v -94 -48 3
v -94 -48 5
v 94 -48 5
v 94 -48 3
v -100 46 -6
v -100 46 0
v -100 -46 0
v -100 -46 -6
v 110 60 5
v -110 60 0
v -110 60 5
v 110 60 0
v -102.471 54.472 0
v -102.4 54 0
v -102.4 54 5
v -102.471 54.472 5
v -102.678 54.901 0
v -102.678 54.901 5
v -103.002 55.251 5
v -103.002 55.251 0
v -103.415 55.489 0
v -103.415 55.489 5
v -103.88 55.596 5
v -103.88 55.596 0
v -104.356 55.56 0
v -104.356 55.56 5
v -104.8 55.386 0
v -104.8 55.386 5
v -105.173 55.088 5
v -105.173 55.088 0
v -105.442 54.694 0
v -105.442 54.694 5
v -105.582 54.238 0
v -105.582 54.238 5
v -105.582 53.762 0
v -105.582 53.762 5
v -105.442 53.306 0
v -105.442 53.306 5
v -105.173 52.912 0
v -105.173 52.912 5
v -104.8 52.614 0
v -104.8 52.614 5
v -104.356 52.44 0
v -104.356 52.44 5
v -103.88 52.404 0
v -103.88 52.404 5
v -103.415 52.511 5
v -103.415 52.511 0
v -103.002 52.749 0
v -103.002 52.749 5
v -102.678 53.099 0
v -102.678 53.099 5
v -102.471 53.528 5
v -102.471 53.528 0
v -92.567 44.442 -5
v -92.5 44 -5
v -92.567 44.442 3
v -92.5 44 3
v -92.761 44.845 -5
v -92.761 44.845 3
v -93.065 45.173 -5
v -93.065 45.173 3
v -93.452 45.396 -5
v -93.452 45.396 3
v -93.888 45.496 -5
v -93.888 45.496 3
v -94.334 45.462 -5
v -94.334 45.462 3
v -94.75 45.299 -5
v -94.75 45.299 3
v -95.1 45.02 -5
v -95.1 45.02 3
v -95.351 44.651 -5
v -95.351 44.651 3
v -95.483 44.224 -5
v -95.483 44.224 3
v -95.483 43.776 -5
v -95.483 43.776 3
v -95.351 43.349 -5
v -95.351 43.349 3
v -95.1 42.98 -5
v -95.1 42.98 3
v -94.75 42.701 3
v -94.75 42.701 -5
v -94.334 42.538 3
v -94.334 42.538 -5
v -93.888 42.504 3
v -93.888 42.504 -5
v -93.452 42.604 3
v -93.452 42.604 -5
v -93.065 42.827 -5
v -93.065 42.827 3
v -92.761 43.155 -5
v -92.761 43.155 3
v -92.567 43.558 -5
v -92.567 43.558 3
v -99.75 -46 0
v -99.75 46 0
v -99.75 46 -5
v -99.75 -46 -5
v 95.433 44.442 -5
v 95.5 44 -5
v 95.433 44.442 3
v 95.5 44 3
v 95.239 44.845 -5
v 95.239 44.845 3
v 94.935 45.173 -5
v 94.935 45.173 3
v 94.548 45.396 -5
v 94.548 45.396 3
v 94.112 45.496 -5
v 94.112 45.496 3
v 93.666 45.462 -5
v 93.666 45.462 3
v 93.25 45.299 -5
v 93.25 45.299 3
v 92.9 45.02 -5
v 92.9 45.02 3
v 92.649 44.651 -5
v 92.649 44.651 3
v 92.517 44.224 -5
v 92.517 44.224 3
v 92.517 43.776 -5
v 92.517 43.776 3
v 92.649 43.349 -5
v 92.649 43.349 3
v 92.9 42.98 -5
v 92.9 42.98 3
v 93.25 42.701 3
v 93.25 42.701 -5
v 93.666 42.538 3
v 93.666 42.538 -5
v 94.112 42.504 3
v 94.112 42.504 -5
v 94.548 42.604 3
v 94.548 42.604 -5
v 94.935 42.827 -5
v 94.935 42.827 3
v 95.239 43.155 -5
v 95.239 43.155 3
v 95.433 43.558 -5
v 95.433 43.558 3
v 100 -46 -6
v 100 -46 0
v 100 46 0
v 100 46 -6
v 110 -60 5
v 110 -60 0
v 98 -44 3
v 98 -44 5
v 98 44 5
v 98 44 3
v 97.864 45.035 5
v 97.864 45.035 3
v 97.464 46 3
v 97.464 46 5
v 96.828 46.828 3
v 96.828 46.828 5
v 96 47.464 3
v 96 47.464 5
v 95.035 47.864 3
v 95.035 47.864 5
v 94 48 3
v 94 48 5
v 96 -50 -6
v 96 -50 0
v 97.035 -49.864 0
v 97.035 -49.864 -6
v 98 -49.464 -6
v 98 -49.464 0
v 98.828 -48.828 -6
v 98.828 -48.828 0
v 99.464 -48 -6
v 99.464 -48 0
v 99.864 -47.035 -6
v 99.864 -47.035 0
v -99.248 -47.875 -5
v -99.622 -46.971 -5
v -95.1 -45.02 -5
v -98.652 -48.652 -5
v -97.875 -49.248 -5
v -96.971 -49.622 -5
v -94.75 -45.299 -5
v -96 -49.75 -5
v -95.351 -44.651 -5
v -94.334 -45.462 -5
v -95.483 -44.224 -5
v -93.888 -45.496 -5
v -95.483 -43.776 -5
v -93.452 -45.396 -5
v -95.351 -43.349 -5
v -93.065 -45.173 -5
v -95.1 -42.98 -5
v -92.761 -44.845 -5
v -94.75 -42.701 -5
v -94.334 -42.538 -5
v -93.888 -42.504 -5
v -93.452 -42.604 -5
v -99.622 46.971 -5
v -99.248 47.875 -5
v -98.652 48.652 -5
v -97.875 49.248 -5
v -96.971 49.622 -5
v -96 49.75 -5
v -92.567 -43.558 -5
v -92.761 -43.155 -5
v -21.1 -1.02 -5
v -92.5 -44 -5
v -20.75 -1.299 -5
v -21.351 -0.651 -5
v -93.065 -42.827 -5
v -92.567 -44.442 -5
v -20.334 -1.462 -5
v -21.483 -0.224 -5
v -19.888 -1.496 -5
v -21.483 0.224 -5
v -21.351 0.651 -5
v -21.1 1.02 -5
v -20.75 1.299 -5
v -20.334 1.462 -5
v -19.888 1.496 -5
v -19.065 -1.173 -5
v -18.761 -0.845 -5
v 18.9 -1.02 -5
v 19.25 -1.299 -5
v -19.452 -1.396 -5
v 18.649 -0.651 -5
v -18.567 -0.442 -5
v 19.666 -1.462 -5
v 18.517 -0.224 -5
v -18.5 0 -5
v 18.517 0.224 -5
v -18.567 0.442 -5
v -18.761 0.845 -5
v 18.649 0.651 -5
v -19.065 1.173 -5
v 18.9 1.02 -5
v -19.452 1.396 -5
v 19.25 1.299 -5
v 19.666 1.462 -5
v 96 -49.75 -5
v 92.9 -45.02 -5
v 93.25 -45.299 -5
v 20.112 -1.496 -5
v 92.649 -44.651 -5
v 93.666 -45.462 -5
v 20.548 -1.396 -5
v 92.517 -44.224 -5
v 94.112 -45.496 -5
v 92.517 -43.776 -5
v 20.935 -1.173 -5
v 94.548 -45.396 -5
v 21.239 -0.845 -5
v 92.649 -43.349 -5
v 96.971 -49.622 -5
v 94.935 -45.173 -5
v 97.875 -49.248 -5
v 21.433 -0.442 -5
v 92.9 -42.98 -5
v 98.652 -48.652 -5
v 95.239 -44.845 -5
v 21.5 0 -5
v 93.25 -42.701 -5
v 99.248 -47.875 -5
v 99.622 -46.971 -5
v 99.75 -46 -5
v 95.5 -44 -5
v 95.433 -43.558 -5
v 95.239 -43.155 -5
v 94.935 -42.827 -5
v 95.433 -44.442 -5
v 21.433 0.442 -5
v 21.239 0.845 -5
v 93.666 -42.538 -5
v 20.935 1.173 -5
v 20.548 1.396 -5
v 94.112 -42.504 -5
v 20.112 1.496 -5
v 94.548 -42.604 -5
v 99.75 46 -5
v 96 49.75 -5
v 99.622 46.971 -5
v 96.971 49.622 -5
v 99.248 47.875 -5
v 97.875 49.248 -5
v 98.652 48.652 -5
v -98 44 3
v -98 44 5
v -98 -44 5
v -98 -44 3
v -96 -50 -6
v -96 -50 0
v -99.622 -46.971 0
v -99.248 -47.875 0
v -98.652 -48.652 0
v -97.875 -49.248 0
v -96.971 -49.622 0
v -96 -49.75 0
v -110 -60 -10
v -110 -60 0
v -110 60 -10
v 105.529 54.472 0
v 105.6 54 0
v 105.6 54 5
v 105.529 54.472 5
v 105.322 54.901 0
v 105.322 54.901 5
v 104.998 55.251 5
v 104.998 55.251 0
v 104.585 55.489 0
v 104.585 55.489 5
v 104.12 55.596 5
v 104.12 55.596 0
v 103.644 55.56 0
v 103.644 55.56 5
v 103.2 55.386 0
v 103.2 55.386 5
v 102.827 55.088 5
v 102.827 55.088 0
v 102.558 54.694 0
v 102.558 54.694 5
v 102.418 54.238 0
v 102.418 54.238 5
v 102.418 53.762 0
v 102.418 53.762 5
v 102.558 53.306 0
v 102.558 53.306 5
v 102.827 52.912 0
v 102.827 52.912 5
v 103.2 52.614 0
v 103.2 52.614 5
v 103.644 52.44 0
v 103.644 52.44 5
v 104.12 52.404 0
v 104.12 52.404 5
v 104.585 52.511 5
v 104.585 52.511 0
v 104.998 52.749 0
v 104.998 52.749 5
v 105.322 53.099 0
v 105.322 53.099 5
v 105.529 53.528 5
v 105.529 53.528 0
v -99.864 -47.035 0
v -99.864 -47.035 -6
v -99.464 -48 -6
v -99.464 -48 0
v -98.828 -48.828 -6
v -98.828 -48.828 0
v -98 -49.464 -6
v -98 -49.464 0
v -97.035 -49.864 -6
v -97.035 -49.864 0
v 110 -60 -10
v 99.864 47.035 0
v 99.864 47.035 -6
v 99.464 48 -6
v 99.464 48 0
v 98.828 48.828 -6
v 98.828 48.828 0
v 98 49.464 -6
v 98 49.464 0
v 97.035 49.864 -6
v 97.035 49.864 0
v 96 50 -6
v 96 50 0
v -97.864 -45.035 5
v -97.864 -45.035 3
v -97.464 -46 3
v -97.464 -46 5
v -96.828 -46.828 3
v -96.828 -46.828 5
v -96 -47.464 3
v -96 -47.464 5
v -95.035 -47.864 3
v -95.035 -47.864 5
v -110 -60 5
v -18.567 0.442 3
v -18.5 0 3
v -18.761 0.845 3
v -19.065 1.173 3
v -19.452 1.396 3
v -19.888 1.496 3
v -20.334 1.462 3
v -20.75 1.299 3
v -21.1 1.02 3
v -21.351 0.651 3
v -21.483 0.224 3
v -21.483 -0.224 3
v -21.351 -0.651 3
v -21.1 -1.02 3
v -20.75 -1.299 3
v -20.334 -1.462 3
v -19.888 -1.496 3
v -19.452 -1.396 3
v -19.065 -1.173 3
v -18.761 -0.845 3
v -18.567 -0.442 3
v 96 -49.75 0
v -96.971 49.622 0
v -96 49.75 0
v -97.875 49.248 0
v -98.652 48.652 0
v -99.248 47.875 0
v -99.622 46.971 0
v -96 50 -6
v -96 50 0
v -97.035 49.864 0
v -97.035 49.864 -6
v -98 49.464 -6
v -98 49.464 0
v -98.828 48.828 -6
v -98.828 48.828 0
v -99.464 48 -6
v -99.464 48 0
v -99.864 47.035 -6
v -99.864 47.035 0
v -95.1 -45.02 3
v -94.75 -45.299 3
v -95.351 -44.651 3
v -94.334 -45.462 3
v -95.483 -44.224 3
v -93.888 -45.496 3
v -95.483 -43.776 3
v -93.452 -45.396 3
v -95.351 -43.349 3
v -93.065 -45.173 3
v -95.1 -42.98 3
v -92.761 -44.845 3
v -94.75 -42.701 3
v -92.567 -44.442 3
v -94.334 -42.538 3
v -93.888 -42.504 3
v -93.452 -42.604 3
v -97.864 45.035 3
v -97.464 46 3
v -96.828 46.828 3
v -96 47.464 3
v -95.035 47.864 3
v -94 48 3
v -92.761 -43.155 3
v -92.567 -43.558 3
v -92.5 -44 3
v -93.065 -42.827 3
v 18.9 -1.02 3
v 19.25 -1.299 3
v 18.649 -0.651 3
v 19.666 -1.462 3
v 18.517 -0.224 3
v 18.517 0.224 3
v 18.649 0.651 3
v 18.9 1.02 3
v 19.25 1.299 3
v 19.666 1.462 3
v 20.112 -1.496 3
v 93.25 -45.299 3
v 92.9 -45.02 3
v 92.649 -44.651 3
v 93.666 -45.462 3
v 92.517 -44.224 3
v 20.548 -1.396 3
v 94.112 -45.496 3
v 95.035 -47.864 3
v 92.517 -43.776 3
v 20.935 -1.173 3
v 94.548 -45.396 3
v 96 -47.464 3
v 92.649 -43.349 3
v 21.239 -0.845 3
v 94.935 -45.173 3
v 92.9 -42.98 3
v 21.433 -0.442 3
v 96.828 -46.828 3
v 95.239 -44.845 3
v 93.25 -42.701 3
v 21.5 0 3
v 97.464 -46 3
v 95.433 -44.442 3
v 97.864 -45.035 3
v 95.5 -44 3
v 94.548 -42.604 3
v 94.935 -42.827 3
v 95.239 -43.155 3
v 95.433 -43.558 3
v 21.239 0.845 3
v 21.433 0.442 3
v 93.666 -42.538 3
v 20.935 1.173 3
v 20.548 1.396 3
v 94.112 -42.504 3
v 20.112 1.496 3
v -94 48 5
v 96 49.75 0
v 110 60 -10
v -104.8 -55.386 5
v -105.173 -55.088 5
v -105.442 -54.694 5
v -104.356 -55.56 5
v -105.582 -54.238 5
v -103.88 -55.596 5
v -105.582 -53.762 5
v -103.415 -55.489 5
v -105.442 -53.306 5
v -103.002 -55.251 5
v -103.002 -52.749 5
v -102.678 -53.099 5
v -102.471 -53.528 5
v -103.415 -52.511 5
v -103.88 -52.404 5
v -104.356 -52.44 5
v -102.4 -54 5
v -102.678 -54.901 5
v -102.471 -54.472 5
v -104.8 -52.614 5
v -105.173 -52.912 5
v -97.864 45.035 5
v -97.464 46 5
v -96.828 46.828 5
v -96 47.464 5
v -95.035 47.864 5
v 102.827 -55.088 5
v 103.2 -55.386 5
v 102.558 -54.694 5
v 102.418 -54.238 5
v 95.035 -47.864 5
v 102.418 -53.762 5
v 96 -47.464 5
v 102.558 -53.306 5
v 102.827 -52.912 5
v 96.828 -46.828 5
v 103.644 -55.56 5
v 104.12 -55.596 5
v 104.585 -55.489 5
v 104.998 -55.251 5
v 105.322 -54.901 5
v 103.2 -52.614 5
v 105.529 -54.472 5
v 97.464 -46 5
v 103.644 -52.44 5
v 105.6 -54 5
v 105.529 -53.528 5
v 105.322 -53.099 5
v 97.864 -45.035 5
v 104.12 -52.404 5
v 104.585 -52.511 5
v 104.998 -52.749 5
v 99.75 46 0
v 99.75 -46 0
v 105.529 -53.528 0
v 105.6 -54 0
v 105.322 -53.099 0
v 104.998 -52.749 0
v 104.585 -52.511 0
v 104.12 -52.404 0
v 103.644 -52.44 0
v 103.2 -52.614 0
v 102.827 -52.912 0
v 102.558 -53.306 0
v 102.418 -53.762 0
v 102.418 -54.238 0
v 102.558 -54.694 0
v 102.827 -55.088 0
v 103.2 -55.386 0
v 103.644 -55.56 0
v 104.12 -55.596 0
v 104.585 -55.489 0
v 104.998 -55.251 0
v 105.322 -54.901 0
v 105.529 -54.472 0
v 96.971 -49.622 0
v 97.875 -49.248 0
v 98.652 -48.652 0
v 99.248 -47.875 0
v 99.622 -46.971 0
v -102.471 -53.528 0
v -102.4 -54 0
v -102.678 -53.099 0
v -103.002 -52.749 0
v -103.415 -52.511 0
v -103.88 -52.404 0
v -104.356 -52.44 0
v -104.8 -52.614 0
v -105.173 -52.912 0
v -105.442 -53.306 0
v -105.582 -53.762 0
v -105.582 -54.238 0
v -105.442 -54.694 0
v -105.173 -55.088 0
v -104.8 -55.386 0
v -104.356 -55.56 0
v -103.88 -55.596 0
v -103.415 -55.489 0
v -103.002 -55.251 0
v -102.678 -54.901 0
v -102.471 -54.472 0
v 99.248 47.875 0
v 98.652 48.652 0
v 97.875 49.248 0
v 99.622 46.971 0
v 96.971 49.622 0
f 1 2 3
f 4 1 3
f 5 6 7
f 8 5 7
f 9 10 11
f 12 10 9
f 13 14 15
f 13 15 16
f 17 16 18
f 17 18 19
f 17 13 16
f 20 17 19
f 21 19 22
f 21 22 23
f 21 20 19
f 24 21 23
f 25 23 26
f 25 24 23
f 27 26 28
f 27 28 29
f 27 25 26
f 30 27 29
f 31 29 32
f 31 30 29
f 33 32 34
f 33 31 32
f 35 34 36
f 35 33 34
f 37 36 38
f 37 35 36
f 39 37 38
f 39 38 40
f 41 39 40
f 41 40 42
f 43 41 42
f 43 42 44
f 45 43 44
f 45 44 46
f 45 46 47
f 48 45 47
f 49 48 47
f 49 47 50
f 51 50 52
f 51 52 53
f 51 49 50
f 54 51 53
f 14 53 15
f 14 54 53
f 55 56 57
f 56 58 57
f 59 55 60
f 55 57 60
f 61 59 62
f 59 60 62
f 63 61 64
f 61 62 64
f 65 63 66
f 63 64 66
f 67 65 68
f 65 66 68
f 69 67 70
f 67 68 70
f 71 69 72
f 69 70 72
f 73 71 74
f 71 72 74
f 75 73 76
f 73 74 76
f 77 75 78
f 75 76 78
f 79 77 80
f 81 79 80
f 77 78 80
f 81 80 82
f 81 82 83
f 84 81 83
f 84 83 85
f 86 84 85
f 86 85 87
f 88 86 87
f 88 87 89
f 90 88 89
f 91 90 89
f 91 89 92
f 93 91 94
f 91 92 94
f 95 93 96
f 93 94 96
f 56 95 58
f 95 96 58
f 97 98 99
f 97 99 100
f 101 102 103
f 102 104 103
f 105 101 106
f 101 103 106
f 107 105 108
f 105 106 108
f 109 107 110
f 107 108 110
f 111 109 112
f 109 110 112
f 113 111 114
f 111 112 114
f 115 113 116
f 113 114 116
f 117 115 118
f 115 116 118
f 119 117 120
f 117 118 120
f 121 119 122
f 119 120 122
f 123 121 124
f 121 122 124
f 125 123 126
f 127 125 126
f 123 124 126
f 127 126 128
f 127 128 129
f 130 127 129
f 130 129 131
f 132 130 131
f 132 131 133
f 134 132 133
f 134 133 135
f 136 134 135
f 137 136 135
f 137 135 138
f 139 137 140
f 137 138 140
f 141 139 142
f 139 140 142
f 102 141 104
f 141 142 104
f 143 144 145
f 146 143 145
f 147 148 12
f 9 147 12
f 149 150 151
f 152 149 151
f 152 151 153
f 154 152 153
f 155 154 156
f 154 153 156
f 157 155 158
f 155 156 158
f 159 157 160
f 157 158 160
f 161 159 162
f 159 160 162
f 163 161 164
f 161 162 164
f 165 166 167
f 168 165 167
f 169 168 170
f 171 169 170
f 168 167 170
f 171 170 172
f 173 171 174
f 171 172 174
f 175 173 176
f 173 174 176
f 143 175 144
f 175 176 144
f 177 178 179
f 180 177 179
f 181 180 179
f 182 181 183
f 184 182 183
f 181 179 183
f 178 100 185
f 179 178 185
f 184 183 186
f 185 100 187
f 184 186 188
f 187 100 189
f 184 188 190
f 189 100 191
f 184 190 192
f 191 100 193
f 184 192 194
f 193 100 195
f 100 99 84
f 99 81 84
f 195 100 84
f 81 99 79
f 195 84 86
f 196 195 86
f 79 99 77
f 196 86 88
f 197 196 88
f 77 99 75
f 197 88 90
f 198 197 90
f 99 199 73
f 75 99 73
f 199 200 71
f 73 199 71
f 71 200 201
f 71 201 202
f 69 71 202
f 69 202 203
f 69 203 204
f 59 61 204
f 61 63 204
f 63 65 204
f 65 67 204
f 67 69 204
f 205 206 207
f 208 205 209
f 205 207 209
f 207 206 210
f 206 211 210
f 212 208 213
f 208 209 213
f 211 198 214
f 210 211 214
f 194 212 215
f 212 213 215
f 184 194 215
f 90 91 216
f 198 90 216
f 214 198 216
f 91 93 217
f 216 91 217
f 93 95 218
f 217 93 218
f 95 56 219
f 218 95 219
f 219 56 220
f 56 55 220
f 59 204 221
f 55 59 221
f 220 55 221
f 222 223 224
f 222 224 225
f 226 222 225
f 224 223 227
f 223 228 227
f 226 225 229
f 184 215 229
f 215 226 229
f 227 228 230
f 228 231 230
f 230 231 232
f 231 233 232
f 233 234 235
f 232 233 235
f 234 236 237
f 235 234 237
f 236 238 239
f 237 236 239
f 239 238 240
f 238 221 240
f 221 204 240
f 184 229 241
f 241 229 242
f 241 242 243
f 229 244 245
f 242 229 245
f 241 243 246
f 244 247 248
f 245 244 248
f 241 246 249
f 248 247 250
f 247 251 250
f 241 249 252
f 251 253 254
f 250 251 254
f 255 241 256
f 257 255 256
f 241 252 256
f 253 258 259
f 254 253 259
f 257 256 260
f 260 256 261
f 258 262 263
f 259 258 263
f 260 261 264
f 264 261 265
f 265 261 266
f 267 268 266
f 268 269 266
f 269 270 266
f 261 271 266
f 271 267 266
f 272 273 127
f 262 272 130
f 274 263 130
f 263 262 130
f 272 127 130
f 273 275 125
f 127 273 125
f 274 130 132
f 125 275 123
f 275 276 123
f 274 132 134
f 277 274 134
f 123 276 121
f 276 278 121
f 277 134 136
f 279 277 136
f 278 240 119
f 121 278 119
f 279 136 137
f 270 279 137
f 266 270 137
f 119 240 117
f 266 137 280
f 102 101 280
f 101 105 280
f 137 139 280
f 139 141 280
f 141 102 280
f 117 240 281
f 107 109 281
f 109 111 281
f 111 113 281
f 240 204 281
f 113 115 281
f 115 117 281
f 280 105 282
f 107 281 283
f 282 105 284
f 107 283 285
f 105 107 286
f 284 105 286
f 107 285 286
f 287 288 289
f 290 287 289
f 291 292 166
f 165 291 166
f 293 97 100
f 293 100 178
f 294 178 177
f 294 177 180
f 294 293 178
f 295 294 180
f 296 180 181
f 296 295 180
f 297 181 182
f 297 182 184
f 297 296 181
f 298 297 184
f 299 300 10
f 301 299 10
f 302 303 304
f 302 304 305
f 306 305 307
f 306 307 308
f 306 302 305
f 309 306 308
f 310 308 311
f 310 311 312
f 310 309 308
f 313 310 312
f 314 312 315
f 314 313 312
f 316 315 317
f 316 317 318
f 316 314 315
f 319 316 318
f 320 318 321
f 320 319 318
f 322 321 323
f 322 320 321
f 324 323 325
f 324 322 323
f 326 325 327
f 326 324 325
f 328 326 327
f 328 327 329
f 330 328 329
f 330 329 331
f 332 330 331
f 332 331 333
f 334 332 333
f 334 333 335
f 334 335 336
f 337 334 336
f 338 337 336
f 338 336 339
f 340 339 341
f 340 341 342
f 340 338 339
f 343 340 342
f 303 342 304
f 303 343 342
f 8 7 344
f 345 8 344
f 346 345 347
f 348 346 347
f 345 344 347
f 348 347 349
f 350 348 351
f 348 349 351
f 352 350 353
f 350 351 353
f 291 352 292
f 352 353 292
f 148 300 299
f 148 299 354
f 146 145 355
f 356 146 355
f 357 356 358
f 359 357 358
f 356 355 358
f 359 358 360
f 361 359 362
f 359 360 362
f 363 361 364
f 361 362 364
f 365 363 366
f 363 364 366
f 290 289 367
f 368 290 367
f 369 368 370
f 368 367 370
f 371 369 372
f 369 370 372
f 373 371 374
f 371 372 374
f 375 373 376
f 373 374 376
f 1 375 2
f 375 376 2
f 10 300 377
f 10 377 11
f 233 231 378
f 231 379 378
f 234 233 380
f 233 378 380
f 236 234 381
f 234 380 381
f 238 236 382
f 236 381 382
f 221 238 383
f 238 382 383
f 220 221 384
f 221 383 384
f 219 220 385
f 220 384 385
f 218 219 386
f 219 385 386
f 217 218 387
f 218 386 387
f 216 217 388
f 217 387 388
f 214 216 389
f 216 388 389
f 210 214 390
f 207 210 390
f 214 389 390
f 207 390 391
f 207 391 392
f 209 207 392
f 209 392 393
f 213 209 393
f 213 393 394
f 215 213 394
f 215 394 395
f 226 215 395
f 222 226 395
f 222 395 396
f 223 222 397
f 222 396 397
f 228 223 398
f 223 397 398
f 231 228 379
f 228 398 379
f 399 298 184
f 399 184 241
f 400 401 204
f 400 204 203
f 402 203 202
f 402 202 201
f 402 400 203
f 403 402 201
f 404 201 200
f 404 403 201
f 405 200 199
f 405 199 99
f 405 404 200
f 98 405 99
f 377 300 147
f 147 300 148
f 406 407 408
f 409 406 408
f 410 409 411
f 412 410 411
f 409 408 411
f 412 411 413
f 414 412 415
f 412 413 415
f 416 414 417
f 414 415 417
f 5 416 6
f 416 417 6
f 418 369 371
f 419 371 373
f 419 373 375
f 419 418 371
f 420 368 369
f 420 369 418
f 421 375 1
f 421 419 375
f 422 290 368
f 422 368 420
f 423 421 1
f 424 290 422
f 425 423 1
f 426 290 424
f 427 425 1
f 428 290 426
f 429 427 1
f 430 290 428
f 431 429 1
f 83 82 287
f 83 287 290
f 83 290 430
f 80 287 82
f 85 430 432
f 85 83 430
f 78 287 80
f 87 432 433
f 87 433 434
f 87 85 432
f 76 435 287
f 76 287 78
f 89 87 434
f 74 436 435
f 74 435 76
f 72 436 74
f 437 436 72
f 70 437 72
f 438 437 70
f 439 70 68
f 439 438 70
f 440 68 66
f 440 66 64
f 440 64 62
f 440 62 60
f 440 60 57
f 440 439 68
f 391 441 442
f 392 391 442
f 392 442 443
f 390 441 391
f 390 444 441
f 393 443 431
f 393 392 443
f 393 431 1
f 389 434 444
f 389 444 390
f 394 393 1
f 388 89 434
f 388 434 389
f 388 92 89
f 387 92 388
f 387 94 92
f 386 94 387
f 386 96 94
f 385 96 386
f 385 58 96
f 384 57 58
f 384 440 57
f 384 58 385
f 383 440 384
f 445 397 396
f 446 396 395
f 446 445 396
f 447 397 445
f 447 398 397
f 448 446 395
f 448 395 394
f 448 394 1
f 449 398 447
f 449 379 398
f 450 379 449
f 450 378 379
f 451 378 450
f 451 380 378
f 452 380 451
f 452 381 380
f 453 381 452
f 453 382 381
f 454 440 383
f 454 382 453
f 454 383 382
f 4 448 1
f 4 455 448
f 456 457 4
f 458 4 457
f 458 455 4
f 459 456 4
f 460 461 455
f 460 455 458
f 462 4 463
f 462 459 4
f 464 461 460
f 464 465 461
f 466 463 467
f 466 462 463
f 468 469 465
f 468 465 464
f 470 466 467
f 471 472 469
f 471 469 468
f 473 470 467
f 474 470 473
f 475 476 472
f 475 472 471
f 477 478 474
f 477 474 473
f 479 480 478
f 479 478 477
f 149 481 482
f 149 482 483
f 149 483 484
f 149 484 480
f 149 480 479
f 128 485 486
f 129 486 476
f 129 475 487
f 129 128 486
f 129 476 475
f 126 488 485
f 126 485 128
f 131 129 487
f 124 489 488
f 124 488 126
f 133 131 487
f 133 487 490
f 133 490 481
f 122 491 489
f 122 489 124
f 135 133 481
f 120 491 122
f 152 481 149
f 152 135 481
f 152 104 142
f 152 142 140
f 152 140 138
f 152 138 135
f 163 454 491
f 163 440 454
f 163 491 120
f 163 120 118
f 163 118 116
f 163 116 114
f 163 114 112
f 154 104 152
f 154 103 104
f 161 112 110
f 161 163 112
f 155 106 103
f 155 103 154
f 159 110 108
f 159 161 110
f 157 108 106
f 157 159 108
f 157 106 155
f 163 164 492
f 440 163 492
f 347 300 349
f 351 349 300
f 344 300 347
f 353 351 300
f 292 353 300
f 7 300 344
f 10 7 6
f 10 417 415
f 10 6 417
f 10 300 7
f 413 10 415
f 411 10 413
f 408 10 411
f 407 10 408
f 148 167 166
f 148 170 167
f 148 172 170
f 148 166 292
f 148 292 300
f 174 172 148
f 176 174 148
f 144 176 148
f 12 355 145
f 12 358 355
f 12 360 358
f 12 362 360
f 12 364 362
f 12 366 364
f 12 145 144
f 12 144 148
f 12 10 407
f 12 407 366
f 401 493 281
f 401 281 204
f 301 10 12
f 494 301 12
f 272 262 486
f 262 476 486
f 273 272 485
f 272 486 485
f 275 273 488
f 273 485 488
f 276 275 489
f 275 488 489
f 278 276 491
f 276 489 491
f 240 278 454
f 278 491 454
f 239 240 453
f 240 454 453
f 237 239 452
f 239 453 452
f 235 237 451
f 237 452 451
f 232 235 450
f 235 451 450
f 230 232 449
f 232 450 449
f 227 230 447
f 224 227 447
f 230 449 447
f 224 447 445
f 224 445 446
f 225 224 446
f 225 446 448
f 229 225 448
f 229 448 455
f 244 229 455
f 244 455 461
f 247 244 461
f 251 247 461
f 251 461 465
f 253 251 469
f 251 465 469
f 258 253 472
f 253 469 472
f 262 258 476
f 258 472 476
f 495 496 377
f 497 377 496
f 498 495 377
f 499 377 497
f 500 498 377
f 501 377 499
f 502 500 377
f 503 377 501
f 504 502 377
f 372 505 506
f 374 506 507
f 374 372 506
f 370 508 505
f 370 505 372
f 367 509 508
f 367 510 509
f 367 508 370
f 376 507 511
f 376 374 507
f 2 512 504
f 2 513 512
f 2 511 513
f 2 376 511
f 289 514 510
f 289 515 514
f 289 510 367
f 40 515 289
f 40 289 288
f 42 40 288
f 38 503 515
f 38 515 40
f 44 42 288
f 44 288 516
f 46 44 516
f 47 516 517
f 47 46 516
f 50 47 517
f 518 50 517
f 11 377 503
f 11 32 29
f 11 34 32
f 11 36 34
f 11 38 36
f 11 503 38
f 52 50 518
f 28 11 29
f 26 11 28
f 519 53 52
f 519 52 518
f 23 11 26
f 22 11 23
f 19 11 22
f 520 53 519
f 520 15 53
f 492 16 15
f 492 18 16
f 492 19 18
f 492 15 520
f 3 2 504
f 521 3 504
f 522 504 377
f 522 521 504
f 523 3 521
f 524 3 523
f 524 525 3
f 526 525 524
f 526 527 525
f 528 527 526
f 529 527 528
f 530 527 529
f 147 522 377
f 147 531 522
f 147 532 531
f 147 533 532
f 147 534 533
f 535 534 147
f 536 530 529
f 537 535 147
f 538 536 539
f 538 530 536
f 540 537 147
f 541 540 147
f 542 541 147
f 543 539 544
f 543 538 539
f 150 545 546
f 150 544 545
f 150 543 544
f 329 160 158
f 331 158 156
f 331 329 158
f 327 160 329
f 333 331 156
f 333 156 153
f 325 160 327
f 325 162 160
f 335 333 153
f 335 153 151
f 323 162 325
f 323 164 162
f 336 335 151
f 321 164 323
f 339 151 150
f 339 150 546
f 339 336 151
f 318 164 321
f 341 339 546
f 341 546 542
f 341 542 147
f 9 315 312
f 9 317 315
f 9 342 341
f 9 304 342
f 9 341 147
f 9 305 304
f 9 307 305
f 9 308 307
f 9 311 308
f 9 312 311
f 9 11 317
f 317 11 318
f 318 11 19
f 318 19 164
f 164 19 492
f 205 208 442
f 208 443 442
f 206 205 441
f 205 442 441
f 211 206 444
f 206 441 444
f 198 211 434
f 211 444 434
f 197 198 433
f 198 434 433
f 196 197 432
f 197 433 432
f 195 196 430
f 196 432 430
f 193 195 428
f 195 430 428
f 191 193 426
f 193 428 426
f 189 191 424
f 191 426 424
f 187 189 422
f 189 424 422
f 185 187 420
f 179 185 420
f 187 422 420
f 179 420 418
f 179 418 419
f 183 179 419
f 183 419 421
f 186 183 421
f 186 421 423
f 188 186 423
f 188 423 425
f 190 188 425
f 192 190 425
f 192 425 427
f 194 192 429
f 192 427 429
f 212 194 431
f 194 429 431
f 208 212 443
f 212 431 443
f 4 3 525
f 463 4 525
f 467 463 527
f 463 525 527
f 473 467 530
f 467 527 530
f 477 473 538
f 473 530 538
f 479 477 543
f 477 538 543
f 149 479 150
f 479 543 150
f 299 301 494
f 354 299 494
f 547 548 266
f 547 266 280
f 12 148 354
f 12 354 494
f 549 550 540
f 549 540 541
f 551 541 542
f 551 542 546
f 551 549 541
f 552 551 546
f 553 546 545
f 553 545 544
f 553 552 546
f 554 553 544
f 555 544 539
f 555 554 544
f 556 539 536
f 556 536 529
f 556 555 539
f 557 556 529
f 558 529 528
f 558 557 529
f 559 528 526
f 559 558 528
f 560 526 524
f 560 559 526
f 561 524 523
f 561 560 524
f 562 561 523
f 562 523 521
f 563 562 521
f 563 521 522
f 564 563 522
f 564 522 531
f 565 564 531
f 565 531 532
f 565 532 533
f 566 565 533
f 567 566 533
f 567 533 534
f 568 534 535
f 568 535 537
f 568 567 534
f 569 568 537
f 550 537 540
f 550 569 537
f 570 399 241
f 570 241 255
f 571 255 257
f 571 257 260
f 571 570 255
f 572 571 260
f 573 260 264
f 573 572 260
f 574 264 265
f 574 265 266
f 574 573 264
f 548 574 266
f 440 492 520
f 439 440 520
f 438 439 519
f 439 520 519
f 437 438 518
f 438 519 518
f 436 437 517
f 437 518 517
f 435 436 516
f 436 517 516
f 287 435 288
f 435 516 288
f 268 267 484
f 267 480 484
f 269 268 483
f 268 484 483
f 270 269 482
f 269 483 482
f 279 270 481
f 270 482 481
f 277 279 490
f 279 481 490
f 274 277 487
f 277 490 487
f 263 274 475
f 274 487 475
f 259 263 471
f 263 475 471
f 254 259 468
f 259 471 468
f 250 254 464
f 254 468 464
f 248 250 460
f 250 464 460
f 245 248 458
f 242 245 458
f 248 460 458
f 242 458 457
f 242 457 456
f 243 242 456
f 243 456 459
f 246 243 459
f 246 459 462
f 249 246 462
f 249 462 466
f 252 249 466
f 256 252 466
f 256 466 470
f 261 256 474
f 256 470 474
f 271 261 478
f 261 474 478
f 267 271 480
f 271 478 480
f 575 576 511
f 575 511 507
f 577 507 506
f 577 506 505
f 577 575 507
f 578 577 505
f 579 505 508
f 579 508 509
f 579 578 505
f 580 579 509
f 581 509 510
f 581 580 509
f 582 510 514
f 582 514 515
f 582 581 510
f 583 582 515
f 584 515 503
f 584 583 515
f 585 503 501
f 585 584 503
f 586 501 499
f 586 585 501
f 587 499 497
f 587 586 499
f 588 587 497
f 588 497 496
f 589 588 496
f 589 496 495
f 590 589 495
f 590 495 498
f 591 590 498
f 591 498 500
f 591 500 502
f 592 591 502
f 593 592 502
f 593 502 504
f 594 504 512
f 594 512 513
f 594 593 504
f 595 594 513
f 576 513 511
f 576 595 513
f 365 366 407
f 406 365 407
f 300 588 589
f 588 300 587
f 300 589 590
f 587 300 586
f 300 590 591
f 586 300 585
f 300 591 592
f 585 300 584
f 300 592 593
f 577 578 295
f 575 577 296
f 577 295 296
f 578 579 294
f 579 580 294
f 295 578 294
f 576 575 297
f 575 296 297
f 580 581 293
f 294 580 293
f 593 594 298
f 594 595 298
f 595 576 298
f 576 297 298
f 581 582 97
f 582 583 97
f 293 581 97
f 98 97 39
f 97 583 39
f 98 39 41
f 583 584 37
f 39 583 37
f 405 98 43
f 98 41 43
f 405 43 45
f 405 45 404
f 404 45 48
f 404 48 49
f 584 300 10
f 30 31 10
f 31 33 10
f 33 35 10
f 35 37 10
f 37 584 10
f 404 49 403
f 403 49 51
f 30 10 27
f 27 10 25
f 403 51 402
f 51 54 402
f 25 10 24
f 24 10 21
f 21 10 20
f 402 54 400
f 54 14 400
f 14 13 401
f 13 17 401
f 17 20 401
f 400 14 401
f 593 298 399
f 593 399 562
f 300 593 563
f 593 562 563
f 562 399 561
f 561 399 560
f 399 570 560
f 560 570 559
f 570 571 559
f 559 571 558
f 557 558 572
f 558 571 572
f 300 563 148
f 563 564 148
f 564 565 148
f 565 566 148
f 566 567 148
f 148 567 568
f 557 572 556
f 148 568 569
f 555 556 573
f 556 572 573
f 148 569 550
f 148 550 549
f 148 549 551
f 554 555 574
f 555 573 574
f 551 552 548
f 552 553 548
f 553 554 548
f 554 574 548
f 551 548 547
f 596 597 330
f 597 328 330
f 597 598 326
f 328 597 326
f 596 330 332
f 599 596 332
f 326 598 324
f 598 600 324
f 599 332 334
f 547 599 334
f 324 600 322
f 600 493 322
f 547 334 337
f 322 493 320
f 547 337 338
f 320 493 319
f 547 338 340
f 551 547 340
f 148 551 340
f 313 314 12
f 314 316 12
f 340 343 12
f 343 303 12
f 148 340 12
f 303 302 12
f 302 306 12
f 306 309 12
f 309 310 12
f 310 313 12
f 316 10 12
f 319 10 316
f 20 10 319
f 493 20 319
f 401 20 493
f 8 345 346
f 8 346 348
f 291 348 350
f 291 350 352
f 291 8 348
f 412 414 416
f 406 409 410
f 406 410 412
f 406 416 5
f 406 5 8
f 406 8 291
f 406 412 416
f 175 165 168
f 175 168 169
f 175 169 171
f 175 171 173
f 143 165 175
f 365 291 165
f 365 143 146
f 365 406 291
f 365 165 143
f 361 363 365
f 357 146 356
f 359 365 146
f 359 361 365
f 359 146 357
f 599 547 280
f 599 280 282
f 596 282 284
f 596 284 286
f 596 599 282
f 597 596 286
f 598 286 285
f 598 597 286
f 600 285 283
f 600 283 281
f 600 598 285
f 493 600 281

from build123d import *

# Parameters (mm, degrees)
F0_W     = 220
F0_H     = 120
F1_DEPTH = 10
F2_DEPTH = 6
F3_W     = 220
F3_H     = 120
F3_R     = 1.6
F3_R_2   = 1.5
F4_DEPTH = 5
F5_DEPTH = 5
F7_DEPTH = 2


with BuildPart() as f1:
    # F0 (on Top) → F1 (new body)
    with BuildSketch(Plane.XY):
        Rectangle(F0_W, F0_H)
        with BuildLine():
            Line((-96, 50), (96, 50))
            ThreePointArc((96, 50), (98.8284271247, 48.8284271247), (100, 46))
            Line((100, 46), (100, -46))
            ThreePointArc((100, -46), (98.8284271247, -48.8284271247), (96, -50))
            Line((96, -50), (-96, -50))
            ThreePointArc((-96, -50), (-98.8284271247, -48.8284271247), (-100, -46))
            Line((-100, -46), (-100, 46))
            ThreePointArc((-100, 46), (-98.8284271247, 48.8284271247), (-96, 50))
        make_face(mode=Mode.SUBTRACT)
        with BuildLine():
            ThreePointArc((100, 46), (98.8284271247, 48.8284271247), (96, 50))
            Line((96, 50), (-96, 50))
            ThreePointArc((-96, 50), (-98.8284271247, 48.8284271247), (-100, 46))
            Line((-100, 46), (-100, -46))
            ThreePointArc((-100, -46), (-98.8284271247, -48.8284271247), (-96, -50))
            Line((-96, -50), (96, -50))
            ThreePointArc((96, -50), (98.8284271247, -48.8284271247), (100, -46))
            Line((100, -46), (100, 46))
        make_face()
    extrude(amount=-F1_DEPTH)

    # F0 (on Top) → F2 (cut)
    with BuildSketch(Plane.XY):
        with BuildLine():
            ThreePointArc((100, 46), (98.8284271247, 48.8284271247), (96, 50))
            Line((96, 50), (-96, 50))
            ThreePointArc((-96, 50), (-98.8284271247, 48.8284271247), (-100, 46))
            Line((-100, 46), (-100, -46))
            ThreePointArc((-100, -46), (-98.8284271247, -48.8284271247), (-96, -50))
            Line((-96, -50), (96, -50))
            ThreePointArc((96, -50), (98.8284271247, -48.8284271247), (100, -46))
            Line((100, -46), (100, 46))
        make_face()
    extrude(amount=-F2_DEPTH, mode=Mode.SUBTRACT)


with BuildPart() as f4:
    # F3 (on Top) → F4 (new body)
    with BuildSketch(Plane.XY):
        Rectangle(F3_W, F3_H)
        with Locations((-104, -54)):
            Circle(F3_R, mode=Mode.SUBTRACT)
        with Locations((104, -54)):
            Circle(F3_R, mode=Mode.SUBTRACT)
        with Locations((-104, 54)):
            Circle(F3_R, mode=Mode.SUBTRACT)
        with BuildLine():
            ThreePointArc((-96, -49.75), (-98.6516504294, -48.6516504294), (-99.75, -46))
            Line((-99.75, -46), (-99.75, 46))
            ThreePointArc((-99.75, 46), (-98.6516504294, 48.6516504294), (-96, 49.75))
            Line((-96, 49.75), (96, 49.75))
            ThreePointArc((96, 49.75), (98.6516504294, 48.6516504294), (99.75, 46))
            Line((99.75, 46), (99.75, -46))
            ThreePointArc((99.75, -46), (98.6516504294, -48.6516504294), (96, -49.75))
            Line((96, -49.75), (-96, -49.75))
        make_face(mode=Mode.SUBTRACT)
        with Locations((104, 54)):
            Circle(F3_R, mode=Mode.SUBTRACT)
        with BuildLine():
            Line((-99.75, 46), (-99.75, -46))
            ThreePointArc((-99.75, -46), (-98.6516504294, -48.6516504294), (-96, -49.75))
            Line((-96, -49.75), (96, -49.75))
            ThreePointArc((96, -49.75), (98.6516504294, -48.6516504294), (99.75, -46))
            Line((99.75, -46), (99.75, 46))
            ThreePointArc((99.75, 46), (98.6516504294, 48.6516504294), (96, 49.75))
            Line((96, 49.75), (-96, 49.75))
            ThreePointArc((-96, 49.75), (-98.6516504294, 48.6516504294), (-99.75, 46))
        make_face()
        with Locations((-94, -44)):
            Circle(F3_R_2, mode=Mode.SUBTRACT)
        with Locations((94, -44)):
            Circle(F3_R_2, mode=Mode.SUBTRACT)
        with Locations((-20, 0)):
            Circle(F3_R_2, mode=Mode.SUBTRACT)
        with Locations((-94, 44)):
            Circle(F3_R_2, mode=Mode.SUBTRACT)
        with Locations((20, 0)):
            Circle(F3_R_2, mode=Mode.SUBTRACT)
        with Locations((94, 44)):
            Circle(F3_R_2, mode=Mode.SUBTRACT)
    extrude(amount=F4_DEPTH)

    # F3 (on Top) → F5 (join)
    with BuildSketch(Plane.XY):
        with BuildLine():
            Line((-99.75, 46), (-99.75, -46))
            ThreePointArc((-99.75, -46), (-98.6516504294, -48.6516504294), (-96, -49.75))
            Line((-96, -49.75), (96, -49.75))
            ThreePointArc((96, -49.75), (98.6516504294, -48.6516504294), (99.75, -46))
            Line((99.75, -46), (99.75, 46))
            ThreePointArc((99.75, 46), (98.6516504294, 48.6516504294), (96, 49.75))
            Line((96, 49.75), (-96, 49.75))
            ThreePointArc((-96, 49.75), (-98.6516504294, 48.6516504294), (-99.75, 46))
        make_face()
        with Locations((-94, -44)):
            Circle(F3_R_2, mode=Mode.SUBTRACT)
        with Locations((94, -44)):
            Circle(F3_R_2, mode=Mode.SUBTRACT)
        with Locations((-20, 0)):
            Circle(F3_R_2, mode=Mode.SUBTRACT)
        with Locations((-94, 44)):
            Circle(F3_R_2, mode=Mode.SUBTRACT)
        with Locations((20, 0)):
            Circle(F3_R_2, mode=Mode.SUBTRACT)
        with Locations((94, 44)):
            Circle(F3_R_2, mode=Mode.SUBTRACT)
    extrude(amount=-F5_DEPTH)

    # F6 (on face) → F7 (cut)
    with BuildSketch(Plane.XY.offset(5)):
        with BuildLine():
            Line((94, 48), (-94, 48))
            ThreePointArc((-94, 48), (-96.8284271247, 46.8284271247), (-98, 44))
            Line((-98, 44), (-98, -44))
            ThreePointArc((-98, -44), (-96.8284271247, -46.8284271247), (-94, -48))
            Line((-94, -48), (94, -48))
            ThreePointArc((94, -48), (96.8284271247, -46.8284271247), (98, -44))
            Line((98, -44), (98, 44))
            ThreePointArc((98, 44), (96.8284271247, 46.8284271247), (94, 48))
        make_face()
    extrude(amount=-F7_DEPTH, mode=Mode.SUBTRACT)


solid = Compound([f1.part, f4.part])
